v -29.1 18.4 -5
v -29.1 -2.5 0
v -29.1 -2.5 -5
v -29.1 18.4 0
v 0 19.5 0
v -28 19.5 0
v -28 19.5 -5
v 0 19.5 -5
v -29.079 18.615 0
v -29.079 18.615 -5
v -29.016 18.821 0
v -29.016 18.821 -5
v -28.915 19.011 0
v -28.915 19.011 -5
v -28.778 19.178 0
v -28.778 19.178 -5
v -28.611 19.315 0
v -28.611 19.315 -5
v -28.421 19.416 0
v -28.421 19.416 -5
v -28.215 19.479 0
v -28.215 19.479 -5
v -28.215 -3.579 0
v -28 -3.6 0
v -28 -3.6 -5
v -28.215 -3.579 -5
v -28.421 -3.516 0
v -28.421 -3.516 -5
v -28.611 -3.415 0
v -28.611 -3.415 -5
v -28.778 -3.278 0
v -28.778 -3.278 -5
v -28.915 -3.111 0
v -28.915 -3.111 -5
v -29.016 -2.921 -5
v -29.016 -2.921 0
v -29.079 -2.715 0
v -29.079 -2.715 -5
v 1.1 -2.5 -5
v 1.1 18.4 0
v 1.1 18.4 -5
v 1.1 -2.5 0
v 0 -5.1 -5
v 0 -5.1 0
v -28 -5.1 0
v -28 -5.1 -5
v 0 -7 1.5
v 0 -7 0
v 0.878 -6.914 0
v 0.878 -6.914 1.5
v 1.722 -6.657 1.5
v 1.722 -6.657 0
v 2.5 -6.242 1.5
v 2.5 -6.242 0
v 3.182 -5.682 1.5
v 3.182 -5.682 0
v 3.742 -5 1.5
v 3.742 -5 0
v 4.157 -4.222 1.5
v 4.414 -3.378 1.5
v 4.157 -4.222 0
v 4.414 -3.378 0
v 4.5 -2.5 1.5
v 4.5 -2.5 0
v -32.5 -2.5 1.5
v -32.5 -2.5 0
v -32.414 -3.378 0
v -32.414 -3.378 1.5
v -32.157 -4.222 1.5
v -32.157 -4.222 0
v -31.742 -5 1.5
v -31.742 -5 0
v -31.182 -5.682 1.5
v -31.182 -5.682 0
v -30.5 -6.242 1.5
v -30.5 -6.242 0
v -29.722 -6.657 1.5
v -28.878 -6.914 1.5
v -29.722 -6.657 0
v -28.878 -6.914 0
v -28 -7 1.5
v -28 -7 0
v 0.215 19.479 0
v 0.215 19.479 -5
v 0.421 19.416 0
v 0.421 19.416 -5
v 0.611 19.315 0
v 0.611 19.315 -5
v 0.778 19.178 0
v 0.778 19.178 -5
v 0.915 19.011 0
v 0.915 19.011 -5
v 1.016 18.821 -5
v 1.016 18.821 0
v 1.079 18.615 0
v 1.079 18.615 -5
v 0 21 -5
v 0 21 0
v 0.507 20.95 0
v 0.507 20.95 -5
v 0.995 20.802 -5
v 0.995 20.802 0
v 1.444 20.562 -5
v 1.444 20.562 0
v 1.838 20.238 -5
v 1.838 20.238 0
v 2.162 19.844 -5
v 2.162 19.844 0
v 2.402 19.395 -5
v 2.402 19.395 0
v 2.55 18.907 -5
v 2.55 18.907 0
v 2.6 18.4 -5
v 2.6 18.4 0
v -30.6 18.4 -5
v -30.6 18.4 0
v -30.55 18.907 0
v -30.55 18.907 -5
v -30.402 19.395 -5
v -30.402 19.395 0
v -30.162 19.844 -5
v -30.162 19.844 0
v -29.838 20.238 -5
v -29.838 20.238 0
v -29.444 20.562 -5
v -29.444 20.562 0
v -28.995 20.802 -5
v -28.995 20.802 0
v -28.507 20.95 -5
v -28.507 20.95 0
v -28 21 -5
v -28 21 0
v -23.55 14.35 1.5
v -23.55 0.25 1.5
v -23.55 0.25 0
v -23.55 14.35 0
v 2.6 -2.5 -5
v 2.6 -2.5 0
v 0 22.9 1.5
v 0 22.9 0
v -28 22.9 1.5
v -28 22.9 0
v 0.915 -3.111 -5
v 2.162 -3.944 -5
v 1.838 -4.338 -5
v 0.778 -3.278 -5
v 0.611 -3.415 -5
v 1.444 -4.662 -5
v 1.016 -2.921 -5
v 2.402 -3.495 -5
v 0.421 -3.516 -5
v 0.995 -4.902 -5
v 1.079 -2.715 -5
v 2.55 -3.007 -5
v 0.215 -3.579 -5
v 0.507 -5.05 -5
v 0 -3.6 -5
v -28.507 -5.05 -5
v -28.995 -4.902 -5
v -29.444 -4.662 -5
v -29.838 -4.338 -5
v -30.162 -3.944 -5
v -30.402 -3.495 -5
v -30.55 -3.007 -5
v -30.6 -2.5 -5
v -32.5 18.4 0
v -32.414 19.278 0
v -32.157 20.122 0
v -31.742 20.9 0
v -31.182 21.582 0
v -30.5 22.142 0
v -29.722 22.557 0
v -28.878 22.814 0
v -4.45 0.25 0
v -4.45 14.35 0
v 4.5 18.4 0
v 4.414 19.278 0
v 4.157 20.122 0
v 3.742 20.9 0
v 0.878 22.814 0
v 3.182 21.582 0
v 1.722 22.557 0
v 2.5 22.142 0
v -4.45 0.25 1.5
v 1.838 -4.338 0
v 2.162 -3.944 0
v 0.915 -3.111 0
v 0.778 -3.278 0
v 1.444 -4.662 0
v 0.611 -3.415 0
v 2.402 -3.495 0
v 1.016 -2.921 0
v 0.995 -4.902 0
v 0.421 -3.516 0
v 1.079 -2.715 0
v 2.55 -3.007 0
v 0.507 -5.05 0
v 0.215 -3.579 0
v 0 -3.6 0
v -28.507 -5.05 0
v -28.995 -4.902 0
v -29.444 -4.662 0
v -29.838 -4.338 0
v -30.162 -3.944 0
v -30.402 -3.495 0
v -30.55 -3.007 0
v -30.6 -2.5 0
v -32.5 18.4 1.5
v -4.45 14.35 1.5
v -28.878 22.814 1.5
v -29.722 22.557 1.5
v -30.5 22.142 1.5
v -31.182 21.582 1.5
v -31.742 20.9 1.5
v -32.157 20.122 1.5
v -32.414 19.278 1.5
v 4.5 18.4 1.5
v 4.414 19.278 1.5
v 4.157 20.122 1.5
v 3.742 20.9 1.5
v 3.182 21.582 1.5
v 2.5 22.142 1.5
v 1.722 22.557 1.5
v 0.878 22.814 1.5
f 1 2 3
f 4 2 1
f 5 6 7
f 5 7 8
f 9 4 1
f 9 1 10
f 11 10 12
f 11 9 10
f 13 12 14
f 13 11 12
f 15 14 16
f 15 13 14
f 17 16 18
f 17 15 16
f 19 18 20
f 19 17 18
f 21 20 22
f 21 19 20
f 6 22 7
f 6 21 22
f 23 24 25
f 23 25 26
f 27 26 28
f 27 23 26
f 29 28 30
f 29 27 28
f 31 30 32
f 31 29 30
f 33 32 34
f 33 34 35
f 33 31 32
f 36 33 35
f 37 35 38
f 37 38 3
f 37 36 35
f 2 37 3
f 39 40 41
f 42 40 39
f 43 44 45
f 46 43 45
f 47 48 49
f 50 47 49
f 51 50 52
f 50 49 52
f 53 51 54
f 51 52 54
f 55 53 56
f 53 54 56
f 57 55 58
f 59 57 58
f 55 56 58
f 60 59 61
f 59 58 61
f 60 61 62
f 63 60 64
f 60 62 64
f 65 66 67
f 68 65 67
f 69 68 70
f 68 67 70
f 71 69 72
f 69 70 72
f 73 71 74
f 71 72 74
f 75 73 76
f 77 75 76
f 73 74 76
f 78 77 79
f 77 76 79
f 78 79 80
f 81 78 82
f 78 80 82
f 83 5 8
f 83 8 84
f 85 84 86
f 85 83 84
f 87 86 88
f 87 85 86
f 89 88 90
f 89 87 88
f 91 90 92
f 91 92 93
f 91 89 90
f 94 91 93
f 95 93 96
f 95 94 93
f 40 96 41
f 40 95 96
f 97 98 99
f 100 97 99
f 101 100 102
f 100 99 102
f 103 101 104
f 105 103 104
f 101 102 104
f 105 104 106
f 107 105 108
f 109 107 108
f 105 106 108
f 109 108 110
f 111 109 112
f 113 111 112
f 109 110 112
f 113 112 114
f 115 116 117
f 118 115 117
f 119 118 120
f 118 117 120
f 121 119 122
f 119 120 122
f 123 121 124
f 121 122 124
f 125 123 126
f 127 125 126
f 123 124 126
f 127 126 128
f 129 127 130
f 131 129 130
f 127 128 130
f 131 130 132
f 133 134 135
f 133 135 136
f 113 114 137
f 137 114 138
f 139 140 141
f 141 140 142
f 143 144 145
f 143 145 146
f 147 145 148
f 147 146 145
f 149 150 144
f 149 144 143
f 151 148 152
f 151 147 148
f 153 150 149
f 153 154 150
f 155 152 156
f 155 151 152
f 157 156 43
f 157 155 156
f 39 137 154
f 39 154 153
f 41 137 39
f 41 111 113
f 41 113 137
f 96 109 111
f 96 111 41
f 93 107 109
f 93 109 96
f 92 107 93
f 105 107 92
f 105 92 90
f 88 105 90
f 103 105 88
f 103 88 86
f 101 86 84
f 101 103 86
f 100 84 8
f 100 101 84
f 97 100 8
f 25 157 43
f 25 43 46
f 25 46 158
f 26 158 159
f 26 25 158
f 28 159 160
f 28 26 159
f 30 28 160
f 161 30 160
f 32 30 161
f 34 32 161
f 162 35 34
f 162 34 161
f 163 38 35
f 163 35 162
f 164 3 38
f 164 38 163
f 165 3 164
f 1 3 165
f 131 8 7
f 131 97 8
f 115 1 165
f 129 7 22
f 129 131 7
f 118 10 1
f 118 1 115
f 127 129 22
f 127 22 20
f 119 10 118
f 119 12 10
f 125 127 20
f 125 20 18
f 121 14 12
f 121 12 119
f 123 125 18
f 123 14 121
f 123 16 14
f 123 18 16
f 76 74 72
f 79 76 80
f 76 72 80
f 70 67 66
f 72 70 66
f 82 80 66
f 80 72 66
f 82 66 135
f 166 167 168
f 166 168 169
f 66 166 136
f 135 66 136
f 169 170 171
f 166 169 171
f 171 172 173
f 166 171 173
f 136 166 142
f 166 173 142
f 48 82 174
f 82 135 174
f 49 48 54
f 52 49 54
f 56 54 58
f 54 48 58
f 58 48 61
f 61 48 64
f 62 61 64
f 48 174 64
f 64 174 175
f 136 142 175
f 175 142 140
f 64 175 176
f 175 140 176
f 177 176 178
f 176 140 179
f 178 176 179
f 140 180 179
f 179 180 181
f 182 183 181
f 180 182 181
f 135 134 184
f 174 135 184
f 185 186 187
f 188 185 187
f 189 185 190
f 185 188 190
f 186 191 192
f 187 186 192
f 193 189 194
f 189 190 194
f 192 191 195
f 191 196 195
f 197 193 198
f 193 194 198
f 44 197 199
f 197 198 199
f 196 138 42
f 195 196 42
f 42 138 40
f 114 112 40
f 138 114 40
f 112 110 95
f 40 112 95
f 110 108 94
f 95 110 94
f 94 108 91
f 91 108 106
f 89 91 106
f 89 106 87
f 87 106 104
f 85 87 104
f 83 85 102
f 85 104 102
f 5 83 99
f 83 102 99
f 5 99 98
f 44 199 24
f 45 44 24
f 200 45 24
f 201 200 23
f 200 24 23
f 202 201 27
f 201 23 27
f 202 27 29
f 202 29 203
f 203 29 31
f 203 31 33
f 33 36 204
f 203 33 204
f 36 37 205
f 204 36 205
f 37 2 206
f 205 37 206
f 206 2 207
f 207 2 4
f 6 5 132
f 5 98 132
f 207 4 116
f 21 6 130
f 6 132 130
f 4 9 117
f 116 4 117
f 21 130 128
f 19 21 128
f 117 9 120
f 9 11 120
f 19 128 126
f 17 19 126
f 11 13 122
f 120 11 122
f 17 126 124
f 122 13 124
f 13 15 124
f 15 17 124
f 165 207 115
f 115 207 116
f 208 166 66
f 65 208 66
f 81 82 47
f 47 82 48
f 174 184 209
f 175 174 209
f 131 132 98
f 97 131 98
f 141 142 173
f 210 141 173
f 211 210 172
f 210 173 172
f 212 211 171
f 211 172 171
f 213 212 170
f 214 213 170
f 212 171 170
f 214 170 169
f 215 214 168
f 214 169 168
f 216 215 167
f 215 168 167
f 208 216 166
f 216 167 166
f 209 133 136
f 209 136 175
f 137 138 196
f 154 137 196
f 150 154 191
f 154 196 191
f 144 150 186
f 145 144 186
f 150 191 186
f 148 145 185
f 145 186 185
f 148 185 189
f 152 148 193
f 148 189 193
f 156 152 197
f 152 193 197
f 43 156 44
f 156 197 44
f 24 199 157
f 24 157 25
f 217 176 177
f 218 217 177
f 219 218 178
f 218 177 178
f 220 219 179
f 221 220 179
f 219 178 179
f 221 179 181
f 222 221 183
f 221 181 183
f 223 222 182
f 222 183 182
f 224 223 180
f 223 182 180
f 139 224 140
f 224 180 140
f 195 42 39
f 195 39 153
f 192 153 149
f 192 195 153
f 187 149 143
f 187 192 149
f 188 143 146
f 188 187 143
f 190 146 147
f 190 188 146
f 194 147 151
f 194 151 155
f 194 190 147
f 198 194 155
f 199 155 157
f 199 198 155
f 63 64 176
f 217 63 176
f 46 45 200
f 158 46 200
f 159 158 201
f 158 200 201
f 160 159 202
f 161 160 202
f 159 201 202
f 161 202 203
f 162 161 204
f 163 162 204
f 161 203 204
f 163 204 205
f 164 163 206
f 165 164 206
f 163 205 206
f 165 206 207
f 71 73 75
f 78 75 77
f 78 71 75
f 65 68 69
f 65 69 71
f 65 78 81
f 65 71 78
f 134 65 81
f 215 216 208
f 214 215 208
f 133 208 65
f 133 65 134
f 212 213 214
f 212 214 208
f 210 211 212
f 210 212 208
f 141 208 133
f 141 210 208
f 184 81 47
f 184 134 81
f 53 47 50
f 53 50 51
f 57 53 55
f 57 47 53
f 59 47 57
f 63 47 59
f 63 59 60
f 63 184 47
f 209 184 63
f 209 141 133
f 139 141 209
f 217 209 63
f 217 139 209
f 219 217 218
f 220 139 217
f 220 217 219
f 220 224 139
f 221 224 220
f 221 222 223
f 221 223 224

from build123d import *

# Parameters (mm, degrees)
EXTRUDE_1_DEPTH     = 1.5
EXTRUDE_2_DEPTH     = 5
SKETCH_4_W          = 19.1
SKETCH_4_H          = 14.1
CUT_EXTRUDE_1_DEPTH = 1.5


with BuildPart() as part:
    # 草图1 → 凸台-拉伸1 (new body)
    with BuildSketch(Plane.XY):
        with BuildLine():
            Line((0, 22.9), (-28, 22.9))
            ThreePointArc((-28, 22.9), (-31.181980515, 21.581980515), (-32.5, 18.4))
            Line((-32.5, 18.4), (-32.5, -2.5))
            ThreePointArc((-32.5, -2.5), (-31.181980515, -5.681980515), (-28, -7))
            Line((-28, -7), (0, -7))
            ThreePointArc((0, -7), (3.181980515, -5.681980515), (4.5, -2.5))
            Line((4.5, -2.5), (4.5, 18.4))
            ThreePointArc((4.5, 18.4), (3.181980515, 21.581980515), (0, 22.9))
        make_face()
    extrude(amount=EXTRUDE_1_DEPTH)

    # 草图4 → 切除-拉伸1 (cut)
    with BuildSketch(Plane.XY.offset(1.5)):
        with Locations((-14, 7.3)):
            Rectangle(SKETCH_4_W, SKETCH_4_H)
    extrude(amount=-CUT_EXTRUDE_1_DEPTH, mode=Mode.SUBTRACT)


with BuildPart() as body_2:
    # 草图3 → 凸台-拉伸2 (new body)
    with BuildSketch(Plane.XY):
        with BuildLine():
            Line((-25.232655095, 21), (-3.217775858, 21))
            Line((-3.217775858, 21), (0, 21))
            ThreePointArc((0, 21), (1.838477631, 20.238477631), (2.6, 18.4))
            Line((2.6, 18.4), (2.6, -2.5))
            ThreePointArc((2.6, -2.5), (1.838477631, -4.338477631), (0, -5.1))
            Line((0, -5.1), (-28, -5.1))
            ThreePointArc((-28, -5.1), (-29.838477631, -4.338477631), (-30.6, -2.5))
            Line((-30.6, -2.5), (-30.6, 18.4))
            ThreePointArc((-30.6, 18.4), (-29.838477631, 20.238477631), (-28, 21))
            Line((-28, 21), (-25.232655095, 21))
        make_face()
        with BuildLine():
            Line((-25.232655095, 19.5), (-3.217775858, 19.5))
            Line((-3.217775858, 19.5), (0, 19.5))
            ThreePointArc((0, 19.5), (0.777817459, 19.177817459), (1.1, 18.4))
            Line((1.1, 18.4), (1.1, -2.5))
            ThreePointArc((1.1, -2.5), (0.777817459, -3.277817459), (0, -3.6))
            Line((0, -3.6), (-28, -3.6))
            ThreePointArc((-28, -3.6), (-28.777817459, -3.277817459), (-29.1, -2.5))
            Line((-29.1, -2.5), (-29.1, 18.4))
            ThreePointArc((-29.1, 18.4), (-28.777817459, 19.177817459), (-28, 19.5))
            Line((-28, 19.5), (-25.232655095, 19.5))
        make_face(mode=Mode.SUBTRACT)
    extrude(amount=-EXTRUDE_2_DEPTH)


solid = Compound([part.part, body_2.part])
